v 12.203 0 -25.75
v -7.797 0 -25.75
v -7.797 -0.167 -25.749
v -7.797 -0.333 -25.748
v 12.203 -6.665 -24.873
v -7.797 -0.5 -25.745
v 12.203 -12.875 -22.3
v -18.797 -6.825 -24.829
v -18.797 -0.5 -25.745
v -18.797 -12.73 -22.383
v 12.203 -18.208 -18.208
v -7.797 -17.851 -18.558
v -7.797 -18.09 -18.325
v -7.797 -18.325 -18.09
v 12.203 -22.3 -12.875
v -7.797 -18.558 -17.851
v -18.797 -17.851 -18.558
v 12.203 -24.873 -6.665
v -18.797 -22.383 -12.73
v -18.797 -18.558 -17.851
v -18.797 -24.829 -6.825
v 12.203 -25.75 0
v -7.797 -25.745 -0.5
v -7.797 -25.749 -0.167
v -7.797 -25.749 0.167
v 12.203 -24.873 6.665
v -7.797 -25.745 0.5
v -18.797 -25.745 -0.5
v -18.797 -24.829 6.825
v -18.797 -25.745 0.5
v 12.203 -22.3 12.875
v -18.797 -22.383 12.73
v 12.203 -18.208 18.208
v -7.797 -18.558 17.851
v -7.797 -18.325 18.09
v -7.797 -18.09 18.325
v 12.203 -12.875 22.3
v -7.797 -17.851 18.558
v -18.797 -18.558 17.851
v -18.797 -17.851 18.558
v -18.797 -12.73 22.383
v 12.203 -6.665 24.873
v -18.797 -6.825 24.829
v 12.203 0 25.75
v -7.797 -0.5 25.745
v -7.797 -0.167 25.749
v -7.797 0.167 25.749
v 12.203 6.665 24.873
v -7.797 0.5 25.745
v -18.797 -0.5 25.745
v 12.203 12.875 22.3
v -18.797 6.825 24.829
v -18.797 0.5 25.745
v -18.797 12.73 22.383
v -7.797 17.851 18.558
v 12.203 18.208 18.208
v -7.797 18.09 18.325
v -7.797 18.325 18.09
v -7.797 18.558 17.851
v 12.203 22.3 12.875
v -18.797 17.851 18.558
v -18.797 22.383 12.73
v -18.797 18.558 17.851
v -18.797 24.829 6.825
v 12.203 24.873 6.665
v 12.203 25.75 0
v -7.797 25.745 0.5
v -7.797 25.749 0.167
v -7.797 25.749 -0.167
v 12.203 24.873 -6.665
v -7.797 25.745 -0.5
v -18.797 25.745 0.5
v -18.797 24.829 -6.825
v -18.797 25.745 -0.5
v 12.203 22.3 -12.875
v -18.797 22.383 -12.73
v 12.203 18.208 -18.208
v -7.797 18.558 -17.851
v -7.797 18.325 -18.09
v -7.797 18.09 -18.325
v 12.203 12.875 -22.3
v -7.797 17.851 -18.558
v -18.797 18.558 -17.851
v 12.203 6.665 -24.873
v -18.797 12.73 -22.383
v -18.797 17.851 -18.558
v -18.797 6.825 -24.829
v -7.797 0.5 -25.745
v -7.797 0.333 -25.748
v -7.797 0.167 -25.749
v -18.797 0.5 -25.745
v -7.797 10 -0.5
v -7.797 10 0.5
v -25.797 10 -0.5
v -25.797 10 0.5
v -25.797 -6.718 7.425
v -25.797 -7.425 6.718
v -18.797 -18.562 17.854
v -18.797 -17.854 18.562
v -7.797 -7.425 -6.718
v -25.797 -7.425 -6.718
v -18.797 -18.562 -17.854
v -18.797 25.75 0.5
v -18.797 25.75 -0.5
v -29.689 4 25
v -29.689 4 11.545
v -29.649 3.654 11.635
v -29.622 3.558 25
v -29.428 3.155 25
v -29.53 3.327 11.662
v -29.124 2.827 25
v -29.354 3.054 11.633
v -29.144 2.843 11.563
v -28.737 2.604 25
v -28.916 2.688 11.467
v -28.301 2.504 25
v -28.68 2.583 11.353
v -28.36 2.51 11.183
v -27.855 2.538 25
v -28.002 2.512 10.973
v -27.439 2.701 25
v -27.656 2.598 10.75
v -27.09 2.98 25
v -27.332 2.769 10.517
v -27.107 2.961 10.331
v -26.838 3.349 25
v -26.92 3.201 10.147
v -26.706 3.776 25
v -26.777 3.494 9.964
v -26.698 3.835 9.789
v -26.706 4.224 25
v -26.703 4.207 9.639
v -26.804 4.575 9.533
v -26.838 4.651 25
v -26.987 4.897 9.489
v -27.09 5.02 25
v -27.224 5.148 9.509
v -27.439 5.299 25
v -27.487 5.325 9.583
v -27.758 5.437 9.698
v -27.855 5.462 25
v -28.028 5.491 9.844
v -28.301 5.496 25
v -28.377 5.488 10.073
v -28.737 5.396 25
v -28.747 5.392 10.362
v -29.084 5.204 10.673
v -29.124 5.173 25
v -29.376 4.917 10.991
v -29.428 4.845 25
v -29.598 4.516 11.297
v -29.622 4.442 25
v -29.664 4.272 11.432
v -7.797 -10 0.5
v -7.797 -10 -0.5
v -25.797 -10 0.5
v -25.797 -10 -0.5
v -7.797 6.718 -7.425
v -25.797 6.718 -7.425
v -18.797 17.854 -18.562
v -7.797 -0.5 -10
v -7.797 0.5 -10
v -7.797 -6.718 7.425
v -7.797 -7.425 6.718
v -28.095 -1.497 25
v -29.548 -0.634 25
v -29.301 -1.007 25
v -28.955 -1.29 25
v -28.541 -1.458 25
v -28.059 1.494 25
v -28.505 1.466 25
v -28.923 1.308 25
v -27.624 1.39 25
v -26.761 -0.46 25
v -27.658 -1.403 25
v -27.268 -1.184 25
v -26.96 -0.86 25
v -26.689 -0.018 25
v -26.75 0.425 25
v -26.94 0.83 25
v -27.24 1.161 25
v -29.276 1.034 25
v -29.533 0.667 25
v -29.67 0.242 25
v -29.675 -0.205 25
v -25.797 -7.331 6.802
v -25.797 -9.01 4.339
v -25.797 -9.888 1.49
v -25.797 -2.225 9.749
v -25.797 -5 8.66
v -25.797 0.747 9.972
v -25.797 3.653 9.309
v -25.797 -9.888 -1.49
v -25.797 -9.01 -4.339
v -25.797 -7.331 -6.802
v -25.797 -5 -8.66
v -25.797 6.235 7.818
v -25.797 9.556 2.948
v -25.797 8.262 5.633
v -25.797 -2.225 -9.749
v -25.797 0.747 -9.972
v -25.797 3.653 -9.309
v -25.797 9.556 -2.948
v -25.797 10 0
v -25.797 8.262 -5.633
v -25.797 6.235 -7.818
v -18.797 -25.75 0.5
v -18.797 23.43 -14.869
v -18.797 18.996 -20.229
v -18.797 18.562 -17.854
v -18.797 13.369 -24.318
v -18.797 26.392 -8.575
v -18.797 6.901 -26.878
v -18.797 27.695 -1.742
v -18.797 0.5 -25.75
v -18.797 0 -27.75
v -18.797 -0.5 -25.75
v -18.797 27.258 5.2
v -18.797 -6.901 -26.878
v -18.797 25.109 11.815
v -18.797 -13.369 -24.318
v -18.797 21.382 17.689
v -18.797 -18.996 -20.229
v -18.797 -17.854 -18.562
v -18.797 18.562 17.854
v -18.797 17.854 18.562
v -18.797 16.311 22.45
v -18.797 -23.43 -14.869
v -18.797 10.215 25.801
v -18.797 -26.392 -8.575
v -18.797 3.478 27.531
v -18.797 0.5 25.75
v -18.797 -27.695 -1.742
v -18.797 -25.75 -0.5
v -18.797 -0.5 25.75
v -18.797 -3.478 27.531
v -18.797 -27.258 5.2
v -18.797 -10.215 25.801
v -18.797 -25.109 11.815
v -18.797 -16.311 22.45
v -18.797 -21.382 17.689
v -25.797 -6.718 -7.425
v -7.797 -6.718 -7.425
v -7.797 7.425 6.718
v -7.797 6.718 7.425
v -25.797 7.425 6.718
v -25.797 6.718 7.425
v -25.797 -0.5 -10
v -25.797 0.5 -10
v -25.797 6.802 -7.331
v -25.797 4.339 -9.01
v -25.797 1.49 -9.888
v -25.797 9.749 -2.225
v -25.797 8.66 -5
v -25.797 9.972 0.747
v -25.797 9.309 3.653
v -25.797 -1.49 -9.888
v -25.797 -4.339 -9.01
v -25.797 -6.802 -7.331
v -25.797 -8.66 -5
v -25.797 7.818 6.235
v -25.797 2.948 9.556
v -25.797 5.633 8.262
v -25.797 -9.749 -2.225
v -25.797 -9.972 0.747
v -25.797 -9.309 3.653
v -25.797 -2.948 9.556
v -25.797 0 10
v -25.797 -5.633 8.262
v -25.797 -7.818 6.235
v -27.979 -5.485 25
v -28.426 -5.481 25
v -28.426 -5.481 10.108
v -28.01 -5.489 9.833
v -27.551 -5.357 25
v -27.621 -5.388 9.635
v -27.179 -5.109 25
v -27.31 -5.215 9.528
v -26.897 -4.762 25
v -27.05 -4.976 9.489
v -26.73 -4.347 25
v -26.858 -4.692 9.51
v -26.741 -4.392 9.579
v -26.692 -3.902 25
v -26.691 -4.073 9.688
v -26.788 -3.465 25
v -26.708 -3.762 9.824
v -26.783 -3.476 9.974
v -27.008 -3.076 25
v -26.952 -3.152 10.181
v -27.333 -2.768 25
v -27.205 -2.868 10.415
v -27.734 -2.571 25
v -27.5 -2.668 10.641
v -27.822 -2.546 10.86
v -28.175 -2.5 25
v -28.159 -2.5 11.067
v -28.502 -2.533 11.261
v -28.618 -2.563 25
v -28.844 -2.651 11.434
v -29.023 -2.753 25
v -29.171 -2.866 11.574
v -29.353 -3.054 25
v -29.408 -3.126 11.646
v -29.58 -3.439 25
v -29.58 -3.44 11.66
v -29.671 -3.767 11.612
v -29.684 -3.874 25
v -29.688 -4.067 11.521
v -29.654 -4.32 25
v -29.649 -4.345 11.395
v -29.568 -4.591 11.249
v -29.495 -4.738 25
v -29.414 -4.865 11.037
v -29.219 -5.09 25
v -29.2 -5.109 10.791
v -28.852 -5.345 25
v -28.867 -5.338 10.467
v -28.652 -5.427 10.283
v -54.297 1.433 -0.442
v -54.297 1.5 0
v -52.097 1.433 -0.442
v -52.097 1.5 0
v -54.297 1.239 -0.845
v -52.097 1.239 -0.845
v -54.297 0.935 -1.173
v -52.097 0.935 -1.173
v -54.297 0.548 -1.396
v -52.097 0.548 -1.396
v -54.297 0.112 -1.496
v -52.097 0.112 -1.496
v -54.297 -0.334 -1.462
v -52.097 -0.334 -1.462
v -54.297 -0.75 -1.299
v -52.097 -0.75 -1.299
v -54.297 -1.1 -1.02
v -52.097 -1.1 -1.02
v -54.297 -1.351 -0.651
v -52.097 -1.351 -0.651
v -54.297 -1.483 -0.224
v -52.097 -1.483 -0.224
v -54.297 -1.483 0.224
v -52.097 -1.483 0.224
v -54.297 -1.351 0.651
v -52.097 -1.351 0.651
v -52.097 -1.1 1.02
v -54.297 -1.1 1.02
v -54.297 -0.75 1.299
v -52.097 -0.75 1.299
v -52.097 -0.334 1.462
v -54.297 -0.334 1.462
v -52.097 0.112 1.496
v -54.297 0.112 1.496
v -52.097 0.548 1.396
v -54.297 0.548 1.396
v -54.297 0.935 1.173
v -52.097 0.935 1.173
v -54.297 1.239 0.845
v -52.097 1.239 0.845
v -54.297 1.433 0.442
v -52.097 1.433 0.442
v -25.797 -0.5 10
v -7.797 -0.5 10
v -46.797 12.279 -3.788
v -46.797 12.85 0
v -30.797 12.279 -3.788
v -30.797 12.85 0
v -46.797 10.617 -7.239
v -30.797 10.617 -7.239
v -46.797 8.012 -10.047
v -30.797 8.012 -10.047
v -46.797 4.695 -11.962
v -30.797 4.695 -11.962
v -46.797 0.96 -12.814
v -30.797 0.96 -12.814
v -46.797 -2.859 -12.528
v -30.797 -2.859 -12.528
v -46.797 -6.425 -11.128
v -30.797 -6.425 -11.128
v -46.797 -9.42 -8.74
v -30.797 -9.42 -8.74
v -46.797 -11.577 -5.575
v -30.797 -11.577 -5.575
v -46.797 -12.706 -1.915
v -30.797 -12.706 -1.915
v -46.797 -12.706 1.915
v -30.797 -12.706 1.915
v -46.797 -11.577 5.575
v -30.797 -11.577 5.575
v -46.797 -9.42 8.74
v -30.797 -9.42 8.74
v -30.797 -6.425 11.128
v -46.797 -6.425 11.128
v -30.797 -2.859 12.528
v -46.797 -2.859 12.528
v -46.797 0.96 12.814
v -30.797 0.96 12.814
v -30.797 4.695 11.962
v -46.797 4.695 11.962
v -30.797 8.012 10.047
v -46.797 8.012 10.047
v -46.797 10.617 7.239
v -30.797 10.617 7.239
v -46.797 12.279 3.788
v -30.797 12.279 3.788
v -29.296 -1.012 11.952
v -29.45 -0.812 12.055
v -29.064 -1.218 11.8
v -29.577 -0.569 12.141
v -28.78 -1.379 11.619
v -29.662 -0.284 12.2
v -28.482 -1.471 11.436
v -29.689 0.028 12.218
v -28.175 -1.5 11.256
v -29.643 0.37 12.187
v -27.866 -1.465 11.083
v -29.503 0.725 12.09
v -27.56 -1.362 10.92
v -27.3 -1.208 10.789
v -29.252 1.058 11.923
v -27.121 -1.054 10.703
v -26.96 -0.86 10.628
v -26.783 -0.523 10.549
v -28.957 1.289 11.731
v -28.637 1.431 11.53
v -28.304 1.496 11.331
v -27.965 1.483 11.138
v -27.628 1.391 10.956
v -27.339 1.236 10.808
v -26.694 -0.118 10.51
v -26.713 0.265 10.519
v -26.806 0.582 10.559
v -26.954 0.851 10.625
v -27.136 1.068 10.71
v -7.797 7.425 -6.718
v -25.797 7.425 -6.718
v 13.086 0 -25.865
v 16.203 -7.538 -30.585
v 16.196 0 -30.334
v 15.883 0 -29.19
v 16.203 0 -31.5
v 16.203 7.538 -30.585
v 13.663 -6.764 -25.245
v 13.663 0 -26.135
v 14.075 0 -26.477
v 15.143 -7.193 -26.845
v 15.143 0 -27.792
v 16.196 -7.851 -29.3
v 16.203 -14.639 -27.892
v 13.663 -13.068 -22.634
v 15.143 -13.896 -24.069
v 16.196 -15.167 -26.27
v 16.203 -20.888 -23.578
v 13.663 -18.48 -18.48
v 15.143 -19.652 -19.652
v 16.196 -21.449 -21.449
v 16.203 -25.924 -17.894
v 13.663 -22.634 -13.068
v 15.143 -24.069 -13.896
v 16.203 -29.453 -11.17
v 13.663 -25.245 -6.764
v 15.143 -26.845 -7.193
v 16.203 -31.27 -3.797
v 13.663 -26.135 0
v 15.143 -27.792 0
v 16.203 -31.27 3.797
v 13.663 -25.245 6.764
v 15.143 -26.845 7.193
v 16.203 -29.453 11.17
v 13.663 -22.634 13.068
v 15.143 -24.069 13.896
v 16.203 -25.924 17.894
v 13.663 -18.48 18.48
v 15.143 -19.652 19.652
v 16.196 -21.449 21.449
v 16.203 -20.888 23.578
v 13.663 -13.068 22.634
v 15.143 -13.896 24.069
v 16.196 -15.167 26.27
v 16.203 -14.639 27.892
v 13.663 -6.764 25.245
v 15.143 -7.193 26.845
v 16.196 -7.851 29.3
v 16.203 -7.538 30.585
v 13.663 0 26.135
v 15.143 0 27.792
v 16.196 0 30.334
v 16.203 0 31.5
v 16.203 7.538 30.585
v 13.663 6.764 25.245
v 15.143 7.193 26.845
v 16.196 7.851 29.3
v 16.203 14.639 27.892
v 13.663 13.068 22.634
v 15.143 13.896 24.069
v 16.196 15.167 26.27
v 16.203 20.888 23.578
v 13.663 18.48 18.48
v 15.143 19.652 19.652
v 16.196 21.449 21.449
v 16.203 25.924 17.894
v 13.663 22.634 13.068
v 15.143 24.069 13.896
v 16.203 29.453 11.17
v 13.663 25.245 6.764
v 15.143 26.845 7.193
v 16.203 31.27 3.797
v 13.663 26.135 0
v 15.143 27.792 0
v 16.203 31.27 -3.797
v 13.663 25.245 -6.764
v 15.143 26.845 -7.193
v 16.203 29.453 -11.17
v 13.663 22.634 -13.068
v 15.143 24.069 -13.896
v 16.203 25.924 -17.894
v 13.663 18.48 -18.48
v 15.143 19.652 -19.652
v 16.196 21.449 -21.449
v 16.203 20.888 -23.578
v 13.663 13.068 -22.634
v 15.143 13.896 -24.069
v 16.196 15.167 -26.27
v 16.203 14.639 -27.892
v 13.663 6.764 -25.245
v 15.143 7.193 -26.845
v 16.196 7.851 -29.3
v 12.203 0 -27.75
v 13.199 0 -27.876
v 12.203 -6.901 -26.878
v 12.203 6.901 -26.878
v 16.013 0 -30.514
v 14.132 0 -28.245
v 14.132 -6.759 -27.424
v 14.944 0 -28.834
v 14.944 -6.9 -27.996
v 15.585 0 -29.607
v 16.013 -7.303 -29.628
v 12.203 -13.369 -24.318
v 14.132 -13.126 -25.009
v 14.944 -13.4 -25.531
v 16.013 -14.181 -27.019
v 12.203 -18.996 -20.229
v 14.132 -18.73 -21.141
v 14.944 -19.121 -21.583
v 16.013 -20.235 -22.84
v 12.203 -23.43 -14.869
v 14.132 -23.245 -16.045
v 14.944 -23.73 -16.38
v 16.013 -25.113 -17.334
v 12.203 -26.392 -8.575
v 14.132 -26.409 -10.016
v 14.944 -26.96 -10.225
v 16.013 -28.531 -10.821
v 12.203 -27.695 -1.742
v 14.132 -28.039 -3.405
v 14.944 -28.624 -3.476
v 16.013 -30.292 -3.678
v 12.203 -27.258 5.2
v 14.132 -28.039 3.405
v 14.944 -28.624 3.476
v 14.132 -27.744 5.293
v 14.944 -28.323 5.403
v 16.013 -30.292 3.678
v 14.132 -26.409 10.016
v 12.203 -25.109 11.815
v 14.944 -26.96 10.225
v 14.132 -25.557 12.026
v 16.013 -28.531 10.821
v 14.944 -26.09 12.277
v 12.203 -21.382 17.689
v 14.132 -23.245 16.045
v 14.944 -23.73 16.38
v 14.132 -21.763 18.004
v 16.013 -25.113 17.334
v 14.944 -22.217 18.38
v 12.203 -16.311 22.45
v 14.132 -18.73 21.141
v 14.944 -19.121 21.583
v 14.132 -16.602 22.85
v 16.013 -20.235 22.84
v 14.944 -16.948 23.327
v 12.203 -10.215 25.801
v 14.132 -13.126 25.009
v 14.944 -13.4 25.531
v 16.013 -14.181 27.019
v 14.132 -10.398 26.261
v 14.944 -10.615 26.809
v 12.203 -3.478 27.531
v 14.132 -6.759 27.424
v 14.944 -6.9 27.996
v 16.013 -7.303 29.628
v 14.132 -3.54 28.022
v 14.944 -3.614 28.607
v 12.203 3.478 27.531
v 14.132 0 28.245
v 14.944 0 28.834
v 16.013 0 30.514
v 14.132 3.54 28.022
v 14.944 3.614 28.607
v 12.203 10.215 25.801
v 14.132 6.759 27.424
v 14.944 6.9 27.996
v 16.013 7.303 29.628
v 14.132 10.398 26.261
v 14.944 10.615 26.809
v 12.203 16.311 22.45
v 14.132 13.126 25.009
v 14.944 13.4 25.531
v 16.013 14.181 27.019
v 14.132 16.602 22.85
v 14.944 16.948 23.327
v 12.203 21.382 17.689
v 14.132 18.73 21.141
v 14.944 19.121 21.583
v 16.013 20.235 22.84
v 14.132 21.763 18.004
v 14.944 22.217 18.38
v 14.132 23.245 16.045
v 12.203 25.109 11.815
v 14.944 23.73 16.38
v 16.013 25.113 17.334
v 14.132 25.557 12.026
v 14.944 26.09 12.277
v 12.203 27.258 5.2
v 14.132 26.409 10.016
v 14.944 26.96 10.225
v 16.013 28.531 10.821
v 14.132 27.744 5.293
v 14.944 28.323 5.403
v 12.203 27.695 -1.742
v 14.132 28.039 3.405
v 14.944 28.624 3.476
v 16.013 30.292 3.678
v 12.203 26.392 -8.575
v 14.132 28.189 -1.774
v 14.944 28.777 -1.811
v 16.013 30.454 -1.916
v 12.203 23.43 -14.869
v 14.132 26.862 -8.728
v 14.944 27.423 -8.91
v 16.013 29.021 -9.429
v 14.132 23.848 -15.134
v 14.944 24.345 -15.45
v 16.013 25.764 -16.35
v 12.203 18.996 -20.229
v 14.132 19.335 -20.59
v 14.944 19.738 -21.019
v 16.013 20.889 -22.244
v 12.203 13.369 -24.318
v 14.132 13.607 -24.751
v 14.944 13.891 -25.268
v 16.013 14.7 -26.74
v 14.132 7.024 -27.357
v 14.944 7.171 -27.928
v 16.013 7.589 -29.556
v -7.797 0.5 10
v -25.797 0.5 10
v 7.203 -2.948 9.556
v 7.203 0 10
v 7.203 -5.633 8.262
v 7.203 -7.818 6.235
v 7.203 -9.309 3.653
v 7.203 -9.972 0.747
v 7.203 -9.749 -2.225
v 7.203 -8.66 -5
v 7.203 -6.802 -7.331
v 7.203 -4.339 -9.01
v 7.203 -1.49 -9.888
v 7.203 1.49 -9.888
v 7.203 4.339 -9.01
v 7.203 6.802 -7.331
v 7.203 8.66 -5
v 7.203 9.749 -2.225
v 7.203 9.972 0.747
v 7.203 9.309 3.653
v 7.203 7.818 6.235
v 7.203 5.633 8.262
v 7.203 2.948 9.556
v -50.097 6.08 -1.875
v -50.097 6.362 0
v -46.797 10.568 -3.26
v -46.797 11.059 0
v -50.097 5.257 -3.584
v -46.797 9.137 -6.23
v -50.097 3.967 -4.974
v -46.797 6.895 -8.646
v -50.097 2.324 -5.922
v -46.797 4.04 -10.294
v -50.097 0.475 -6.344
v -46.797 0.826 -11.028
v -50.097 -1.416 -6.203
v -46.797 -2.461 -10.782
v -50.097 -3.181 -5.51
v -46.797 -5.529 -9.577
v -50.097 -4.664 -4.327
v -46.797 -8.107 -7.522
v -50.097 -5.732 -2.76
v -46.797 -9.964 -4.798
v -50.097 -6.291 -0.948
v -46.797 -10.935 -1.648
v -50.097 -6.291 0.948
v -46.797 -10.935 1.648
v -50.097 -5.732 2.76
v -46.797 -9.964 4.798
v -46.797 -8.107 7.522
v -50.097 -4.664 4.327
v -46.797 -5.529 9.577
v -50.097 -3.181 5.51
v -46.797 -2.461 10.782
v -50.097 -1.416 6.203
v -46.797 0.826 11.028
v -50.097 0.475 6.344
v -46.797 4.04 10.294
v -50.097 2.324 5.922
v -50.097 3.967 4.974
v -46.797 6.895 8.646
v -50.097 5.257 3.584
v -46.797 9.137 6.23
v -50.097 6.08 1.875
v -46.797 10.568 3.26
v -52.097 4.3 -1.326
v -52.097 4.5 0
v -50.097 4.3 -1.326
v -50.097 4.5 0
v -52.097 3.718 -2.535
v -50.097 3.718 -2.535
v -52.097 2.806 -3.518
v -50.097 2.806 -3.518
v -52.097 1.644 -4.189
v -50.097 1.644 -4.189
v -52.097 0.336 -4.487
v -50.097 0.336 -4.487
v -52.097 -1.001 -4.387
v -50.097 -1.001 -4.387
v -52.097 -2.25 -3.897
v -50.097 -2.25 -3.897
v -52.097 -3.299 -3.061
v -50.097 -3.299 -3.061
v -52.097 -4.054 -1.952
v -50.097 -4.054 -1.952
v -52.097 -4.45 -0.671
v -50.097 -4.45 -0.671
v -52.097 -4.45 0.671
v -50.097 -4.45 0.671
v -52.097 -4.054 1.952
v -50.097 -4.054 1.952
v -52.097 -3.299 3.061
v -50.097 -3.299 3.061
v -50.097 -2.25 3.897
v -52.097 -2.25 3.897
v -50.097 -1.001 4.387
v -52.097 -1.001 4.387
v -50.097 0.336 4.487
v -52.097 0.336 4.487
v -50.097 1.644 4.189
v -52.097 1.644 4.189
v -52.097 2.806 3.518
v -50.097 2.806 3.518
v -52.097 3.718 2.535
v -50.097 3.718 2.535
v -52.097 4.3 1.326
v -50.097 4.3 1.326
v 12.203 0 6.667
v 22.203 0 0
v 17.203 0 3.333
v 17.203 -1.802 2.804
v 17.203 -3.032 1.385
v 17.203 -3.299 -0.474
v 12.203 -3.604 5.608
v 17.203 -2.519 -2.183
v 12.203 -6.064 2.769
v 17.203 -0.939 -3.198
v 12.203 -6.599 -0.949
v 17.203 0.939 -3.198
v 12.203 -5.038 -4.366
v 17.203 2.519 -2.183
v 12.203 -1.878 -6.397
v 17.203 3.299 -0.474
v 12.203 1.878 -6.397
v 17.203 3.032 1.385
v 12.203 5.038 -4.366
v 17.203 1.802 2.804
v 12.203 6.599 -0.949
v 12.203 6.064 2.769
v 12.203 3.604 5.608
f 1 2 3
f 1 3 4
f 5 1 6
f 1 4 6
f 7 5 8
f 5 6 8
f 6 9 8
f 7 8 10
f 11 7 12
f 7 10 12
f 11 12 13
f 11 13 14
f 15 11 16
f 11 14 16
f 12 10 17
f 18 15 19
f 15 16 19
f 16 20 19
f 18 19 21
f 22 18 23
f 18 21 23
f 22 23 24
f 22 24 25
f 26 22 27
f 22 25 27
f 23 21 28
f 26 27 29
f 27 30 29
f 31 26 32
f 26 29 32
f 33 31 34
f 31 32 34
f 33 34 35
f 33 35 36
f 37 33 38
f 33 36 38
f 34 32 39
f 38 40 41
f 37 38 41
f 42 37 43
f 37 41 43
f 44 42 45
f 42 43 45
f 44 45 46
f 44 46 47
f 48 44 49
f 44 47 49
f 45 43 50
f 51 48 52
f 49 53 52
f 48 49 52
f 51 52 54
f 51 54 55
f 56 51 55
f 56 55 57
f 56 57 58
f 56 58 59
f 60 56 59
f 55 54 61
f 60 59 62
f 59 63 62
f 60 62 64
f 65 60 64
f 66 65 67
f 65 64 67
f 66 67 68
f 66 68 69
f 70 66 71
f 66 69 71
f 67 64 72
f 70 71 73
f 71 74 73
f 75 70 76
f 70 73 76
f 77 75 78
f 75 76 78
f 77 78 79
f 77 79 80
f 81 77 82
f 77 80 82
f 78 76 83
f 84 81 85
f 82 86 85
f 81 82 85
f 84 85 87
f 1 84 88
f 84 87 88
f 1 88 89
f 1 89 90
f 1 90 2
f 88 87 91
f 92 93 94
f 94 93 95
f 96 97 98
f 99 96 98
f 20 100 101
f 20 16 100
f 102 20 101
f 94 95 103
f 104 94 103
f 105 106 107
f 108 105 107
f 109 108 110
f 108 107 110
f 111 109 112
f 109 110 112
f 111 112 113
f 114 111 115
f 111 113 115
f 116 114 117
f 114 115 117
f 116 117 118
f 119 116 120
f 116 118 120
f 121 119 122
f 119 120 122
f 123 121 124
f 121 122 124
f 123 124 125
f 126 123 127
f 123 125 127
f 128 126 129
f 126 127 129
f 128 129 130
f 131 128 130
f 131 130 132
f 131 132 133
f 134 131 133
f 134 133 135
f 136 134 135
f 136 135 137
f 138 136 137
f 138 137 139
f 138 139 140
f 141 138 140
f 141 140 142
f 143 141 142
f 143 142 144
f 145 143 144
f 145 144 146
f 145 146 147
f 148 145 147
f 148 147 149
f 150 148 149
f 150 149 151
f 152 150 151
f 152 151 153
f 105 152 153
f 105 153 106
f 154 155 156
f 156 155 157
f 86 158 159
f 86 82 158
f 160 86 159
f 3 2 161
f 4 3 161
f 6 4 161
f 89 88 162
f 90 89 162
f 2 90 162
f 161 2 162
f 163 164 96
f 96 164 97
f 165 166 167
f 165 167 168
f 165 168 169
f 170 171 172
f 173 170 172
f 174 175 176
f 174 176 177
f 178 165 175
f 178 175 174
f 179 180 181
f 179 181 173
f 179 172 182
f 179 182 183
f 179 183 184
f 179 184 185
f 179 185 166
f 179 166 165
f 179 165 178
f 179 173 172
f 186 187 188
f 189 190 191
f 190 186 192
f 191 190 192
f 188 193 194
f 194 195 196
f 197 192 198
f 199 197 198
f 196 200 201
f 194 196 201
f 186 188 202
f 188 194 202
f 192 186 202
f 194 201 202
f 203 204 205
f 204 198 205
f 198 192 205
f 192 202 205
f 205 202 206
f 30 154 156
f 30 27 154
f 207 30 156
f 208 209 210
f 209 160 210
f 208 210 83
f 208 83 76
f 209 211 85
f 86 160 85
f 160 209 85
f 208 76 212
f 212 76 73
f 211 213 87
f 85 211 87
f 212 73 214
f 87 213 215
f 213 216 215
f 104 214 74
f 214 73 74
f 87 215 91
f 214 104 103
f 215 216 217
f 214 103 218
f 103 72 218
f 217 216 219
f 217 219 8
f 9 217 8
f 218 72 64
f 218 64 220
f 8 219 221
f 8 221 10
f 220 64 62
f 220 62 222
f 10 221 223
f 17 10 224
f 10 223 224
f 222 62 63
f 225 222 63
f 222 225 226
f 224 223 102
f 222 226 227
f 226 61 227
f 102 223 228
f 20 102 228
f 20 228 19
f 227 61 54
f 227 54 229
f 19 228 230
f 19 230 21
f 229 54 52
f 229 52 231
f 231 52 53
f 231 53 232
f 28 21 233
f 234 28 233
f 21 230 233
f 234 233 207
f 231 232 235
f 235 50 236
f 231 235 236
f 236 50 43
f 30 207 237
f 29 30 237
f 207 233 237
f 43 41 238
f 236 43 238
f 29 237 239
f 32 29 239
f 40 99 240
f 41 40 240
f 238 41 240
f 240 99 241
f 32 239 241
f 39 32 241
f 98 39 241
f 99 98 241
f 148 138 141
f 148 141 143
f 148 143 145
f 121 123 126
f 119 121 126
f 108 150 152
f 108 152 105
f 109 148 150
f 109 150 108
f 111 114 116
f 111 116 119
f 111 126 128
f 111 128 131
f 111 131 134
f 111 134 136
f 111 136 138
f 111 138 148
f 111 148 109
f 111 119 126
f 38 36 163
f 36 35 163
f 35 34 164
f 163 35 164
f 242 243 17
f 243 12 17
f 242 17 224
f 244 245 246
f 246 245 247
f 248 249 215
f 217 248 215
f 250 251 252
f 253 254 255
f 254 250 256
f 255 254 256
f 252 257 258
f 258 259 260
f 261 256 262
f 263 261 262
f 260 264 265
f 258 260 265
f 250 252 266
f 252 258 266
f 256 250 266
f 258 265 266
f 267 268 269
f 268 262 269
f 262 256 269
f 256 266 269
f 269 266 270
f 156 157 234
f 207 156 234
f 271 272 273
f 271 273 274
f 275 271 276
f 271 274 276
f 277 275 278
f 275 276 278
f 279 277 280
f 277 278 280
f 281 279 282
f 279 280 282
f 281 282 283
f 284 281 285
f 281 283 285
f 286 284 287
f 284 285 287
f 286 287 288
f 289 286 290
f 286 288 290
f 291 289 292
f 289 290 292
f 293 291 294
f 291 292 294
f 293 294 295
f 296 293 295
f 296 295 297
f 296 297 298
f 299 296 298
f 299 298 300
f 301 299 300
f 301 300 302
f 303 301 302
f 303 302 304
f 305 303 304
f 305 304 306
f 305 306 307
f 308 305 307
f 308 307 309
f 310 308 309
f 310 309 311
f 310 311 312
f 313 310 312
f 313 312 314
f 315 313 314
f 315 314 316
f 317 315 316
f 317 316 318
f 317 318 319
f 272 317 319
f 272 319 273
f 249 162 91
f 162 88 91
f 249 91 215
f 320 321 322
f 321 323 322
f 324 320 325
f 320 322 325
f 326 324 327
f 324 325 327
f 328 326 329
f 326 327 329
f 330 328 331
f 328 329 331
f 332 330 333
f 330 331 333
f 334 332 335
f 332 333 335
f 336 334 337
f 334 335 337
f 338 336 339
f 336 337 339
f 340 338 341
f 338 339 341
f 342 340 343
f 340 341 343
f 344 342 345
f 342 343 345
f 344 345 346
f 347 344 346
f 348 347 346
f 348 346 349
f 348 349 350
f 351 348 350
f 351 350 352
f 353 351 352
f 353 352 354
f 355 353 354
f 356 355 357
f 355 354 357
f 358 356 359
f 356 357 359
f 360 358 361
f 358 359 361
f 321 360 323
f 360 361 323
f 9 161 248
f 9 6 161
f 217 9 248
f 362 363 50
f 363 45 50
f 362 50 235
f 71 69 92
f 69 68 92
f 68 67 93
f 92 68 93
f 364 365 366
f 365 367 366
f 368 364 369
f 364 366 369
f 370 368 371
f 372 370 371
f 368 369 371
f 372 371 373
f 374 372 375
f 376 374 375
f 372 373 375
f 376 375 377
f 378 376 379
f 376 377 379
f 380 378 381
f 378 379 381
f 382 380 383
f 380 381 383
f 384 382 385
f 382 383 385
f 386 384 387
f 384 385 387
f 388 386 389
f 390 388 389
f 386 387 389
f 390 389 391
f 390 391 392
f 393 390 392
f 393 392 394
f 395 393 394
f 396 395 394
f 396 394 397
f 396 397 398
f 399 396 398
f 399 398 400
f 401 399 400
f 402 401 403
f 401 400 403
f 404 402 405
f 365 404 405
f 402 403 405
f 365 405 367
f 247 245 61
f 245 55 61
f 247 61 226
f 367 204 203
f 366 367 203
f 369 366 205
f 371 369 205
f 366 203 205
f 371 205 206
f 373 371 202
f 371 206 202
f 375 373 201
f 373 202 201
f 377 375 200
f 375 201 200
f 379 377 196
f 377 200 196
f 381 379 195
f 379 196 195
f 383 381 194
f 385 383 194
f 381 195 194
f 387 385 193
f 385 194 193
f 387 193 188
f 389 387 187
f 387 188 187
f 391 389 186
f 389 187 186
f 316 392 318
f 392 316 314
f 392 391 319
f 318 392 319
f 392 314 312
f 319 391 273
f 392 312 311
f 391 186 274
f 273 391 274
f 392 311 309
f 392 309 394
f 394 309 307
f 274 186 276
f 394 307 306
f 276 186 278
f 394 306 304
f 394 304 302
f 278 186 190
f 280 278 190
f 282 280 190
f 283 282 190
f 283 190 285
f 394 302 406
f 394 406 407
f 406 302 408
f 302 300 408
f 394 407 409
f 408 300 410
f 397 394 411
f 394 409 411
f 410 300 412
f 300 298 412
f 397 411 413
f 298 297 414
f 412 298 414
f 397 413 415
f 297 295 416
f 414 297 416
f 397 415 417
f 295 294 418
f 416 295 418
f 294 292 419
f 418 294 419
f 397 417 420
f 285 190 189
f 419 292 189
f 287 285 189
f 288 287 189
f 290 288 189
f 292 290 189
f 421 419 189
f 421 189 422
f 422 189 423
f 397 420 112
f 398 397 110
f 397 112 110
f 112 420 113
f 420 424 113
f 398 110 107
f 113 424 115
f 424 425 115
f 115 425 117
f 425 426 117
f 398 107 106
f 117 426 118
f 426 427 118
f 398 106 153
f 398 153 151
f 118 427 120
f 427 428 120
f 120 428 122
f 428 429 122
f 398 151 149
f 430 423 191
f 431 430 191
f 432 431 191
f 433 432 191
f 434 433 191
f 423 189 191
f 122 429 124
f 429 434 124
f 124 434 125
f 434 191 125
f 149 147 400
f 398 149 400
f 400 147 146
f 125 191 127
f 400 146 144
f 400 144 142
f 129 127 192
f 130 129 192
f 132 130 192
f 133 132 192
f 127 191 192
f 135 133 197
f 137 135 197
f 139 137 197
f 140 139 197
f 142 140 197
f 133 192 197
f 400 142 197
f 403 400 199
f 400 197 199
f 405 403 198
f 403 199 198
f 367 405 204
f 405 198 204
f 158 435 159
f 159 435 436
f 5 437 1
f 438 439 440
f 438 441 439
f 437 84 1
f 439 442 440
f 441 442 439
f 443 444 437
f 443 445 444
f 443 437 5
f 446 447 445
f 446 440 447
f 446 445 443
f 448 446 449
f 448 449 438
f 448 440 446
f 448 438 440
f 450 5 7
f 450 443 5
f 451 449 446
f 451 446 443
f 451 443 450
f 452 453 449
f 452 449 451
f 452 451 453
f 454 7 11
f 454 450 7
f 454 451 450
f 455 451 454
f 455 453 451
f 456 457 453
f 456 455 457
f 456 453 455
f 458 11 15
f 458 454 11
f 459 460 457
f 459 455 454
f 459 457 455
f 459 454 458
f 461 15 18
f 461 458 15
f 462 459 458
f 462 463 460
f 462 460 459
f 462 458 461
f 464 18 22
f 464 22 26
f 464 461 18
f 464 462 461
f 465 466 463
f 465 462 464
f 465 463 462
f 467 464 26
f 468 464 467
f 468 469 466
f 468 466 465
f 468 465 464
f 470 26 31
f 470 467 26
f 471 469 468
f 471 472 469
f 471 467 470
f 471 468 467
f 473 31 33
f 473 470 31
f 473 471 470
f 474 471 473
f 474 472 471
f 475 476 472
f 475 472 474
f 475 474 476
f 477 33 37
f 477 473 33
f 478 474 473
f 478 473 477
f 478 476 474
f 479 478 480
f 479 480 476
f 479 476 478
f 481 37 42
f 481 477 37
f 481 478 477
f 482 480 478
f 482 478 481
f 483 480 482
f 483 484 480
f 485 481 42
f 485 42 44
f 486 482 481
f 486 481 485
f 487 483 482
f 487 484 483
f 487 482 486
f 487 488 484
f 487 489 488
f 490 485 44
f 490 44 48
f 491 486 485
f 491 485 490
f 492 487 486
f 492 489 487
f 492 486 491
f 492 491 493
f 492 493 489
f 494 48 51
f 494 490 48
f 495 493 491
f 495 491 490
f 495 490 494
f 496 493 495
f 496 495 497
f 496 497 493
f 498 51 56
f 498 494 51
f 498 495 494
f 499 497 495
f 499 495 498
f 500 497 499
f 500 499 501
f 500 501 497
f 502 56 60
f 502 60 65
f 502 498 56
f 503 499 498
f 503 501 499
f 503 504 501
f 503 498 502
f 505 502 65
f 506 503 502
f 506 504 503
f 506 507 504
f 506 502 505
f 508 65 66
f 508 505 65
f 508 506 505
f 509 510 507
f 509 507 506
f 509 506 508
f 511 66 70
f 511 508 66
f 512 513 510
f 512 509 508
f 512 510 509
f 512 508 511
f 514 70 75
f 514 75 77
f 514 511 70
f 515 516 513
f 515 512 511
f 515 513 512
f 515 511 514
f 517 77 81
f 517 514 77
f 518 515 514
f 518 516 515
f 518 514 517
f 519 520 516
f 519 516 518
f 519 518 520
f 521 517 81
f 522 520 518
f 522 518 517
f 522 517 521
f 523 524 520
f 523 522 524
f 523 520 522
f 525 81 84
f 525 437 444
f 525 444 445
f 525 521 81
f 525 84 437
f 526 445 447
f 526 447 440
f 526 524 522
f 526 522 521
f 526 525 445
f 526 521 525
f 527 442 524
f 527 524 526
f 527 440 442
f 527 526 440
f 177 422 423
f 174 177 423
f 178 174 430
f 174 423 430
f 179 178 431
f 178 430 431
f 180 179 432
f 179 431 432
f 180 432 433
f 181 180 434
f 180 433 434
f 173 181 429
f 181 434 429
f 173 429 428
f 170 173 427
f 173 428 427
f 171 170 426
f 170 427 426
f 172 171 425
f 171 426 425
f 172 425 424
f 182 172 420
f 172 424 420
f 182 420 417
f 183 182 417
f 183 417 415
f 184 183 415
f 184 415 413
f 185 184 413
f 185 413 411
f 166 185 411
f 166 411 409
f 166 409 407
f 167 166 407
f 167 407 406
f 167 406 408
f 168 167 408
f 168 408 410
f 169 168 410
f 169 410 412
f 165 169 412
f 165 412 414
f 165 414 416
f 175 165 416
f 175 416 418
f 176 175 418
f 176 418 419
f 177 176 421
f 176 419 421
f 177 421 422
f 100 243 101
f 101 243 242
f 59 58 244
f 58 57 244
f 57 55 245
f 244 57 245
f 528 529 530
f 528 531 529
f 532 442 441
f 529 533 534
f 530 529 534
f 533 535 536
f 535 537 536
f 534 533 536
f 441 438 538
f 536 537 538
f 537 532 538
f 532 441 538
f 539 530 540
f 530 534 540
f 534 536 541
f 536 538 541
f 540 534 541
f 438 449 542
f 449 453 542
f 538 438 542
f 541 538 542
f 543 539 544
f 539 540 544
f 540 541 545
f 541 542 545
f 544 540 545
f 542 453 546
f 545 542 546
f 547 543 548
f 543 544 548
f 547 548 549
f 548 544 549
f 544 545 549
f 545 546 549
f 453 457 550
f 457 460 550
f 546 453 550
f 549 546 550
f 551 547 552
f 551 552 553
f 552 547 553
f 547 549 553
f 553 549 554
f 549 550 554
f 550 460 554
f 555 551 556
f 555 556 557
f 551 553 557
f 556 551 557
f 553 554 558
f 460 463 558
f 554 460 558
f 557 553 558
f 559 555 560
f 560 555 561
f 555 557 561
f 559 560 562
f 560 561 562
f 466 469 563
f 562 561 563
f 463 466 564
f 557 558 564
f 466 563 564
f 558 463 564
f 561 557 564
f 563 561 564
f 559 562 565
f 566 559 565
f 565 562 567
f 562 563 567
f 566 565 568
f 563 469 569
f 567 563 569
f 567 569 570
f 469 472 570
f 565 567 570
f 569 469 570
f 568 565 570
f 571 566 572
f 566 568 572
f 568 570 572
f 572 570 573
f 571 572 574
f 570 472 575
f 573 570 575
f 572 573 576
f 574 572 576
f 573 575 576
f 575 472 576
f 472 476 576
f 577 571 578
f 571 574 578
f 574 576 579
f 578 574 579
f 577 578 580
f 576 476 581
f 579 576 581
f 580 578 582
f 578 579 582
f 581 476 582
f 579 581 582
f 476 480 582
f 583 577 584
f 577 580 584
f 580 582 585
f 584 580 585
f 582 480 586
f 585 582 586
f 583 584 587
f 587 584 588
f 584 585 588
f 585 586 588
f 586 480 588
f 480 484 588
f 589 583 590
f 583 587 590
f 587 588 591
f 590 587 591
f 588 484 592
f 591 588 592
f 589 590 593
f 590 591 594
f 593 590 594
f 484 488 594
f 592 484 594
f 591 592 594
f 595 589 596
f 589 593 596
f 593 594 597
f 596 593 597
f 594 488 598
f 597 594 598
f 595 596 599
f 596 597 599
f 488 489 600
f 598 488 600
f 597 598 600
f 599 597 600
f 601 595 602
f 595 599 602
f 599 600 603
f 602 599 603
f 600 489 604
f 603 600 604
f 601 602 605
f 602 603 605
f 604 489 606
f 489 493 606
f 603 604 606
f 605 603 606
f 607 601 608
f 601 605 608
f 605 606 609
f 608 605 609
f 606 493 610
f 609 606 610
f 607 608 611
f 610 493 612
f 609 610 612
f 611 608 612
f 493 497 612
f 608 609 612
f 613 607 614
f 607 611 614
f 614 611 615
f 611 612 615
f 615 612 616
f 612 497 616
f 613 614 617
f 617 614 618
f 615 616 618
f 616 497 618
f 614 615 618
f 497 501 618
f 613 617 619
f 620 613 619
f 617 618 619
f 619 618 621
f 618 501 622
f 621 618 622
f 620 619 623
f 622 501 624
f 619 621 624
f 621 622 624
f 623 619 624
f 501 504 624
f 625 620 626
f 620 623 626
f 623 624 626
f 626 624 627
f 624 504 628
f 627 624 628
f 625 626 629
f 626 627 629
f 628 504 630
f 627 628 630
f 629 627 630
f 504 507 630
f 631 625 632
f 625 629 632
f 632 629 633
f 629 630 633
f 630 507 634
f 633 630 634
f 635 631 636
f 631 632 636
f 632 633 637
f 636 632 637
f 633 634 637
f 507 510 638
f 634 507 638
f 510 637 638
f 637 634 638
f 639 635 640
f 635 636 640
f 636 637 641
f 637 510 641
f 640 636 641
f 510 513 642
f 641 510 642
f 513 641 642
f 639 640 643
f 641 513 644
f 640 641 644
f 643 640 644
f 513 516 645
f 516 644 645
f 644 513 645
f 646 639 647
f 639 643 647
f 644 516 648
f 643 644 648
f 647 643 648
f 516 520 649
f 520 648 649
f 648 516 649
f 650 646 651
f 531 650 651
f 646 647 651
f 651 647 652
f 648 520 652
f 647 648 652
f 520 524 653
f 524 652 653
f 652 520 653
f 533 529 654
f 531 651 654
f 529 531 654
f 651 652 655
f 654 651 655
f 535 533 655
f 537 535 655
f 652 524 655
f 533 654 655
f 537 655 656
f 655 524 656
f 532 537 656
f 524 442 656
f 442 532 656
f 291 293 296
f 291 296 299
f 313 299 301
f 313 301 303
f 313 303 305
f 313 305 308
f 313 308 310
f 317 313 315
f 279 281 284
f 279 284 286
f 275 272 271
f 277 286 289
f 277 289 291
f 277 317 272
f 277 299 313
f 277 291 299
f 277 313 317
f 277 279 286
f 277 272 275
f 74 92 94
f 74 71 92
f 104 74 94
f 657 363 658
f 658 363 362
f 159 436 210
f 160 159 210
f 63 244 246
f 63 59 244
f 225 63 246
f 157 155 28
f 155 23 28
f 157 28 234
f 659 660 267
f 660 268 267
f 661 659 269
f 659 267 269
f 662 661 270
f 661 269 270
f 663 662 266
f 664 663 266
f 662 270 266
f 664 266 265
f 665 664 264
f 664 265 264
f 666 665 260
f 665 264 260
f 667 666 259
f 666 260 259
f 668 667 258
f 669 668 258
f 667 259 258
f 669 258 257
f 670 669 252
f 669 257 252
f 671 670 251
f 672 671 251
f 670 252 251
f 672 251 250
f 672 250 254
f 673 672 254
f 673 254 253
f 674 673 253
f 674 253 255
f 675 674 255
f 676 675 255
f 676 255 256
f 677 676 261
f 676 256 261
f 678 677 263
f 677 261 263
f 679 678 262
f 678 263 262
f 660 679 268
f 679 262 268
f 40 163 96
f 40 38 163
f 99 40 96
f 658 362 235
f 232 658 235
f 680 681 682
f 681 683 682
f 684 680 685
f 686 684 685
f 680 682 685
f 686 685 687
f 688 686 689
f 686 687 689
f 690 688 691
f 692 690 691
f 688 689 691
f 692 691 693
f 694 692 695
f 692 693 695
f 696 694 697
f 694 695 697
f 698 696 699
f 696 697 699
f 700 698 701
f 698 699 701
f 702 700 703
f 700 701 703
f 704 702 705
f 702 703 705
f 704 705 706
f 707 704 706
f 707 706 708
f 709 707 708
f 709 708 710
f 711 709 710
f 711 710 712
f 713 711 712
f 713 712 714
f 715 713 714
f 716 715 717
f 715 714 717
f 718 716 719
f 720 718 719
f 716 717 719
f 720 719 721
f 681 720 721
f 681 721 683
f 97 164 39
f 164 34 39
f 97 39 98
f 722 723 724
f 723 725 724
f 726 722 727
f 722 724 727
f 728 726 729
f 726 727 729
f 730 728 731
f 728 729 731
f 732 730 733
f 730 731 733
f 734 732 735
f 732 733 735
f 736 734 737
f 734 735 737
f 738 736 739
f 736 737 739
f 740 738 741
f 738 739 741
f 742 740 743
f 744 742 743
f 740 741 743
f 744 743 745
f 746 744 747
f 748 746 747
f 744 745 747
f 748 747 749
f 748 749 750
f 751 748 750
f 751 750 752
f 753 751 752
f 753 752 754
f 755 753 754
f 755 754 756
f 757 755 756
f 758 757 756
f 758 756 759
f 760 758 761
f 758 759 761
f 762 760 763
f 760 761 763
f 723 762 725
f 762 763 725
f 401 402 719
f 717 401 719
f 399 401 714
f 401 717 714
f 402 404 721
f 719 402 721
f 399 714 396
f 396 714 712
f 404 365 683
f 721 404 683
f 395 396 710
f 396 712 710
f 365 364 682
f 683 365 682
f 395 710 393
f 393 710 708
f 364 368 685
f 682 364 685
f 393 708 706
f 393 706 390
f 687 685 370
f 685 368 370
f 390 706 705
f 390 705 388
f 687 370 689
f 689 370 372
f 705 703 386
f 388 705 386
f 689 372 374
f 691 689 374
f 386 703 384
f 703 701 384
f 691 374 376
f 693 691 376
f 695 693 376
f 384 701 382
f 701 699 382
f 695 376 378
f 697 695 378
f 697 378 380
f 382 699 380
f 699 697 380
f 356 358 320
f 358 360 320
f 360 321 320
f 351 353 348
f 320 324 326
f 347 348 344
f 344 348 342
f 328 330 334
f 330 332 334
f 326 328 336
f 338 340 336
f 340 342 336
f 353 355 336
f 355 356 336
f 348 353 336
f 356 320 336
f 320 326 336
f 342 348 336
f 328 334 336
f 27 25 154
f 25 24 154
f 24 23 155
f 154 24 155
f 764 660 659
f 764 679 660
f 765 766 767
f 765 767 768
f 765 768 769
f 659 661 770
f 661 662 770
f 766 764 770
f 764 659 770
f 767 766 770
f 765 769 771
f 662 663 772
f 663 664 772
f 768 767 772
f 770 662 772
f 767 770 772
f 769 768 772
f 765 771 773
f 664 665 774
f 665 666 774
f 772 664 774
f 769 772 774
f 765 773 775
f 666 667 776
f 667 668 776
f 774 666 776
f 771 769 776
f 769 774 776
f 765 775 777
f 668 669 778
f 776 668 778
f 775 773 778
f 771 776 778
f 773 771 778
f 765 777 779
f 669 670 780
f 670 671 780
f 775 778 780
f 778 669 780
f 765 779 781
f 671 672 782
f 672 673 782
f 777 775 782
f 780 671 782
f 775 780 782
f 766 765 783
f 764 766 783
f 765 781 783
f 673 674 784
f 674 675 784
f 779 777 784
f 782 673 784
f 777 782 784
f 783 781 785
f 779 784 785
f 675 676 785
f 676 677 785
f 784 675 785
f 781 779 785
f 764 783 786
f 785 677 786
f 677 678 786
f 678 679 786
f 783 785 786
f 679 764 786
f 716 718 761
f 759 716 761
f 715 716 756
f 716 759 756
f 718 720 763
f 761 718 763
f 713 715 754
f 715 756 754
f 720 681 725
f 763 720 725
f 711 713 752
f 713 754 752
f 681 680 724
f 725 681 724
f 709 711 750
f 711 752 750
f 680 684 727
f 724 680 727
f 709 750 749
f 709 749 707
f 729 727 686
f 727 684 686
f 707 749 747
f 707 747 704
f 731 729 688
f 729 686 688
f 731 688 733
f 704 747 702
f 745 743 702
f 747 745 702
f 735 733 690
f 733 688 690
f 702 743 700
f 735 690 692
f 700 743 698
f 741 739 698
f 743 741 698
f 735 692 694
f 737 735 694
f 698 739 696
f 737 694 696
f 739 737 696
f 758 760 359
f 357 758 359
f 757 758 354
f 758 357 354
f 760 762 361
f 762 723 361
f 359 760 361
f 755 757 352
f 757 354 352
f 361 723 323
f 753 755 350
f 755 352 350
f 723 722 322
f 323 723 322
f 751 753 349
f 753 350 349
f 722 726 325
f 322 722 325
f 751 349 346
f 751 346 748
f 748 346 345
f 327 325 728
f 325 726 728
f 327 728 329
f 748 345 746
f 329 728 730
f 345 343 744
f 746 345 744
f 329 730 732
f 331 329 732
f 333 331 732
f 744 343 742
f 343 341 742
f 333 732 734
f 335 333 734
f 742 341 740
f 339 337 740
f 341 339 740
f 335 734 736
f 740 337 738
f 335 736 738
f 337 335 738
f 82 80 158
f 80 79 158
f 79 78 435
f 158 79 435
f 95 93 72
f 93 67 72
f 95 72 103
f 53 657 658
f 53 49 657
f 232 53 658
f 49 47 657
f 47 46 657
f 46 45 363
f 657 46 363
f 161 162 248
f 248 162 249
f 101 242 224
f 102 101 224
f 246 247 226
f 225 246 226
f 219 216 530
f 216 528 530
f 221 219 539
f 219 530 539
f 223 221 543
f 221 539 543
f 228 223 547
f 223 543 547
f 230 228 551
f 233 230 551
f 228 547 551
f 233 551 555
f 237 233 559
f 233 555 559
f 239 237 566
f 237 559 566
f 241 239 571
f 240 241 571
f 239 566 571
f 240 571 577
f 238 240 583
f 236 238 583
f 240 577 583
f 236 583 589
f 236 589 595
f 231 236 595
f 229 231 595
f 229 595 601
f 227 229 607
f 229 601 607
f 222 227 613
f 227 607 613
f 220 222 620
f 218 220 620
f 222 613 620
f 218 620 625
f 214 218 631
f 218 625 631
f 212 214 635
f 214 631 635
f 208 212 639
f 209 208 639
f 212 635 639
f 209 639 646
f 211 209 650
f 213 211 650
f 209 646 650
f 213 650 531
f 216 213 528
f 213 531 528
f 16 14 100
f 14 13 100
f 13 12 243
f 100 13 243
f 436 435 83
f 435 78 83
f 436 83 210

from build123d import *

# Parameters (mm, degrees)
BOSS_EXTRU_1_DEPTH           = 0.5
R_P_TITION_CIRCULAIRE1_COUNT = 8
ESQUISSE5_R                  = 1.5
BOSS_EXTRU_2_DEPTH           = 25


with BuildPart() as part:
    # Esquisse1 → Révolution1 (revolve)
    with BuildSketch(Plane.XY, mode=Mode.PRIVATE) as r_volution1_sk:
        with BuildLine():
            Line((-18.797047196, 27.75), (12.202952804, 27.75))
            ThreePointArc((12.202952804, 27.75), (14.944416829, 28.83410504), (16.202952804, 31.5))
            add(Edge.make_bspline(
                [(12.202952804, 25.75), (13.310921502, 25.75), (14.941747161, 27.131971286), (16.465207227, 29.749374737), (16.202952804, 31.5)],
                knots=[0, 0, 0, 0, 0.303786725, 1, 1, 1, 1], degree=3))
            Line((12.202952804, 25.75), (-18.797047196, 25.75))
            Line((-18.797047196, 25.75), (-18.797047196, 27.75))
        make_face()
    revolve(r_volution1_sk.sketch.rotate(Axis((0, 0, 0), (-1, 0, 0)), 90), axis=Axis((0, 0, 0), (-1, 0, 0)))

    # Esquisse3 → Boss.-Extru.1 (add, symmetric)
    with BuildSketch(Plane.XY):
        Polygon((-25.797047196, 10), (-18.797047196, 25.75), (-7.797047196, 25.75), (-7.797047196, 10), align=None)
    boss_extru_1 = extrude(amount=BOSS_EXTRU_1_DEPTH, both=True)

    # Répétition circulaire1: Boss.-Extru.1 ×8 about axis
    r_p_tition_circulaire1_axis = Axis((0, 0, 0), (1, 0, 0))
    for i in range(1, R_P_TITION_CIRCULAIRE1_COUNT):
        add(boss_extru_1.rotate(r_p_tition_circulaire1_axis, i * 360 / R_P_TITION_CIRCULAIRE1_COUNT))


with BuildPart() as body_2:
    # Esquisse2 → Révolution2 (revolve)
    with BuildSketch(Plane.XY, mode=Mode.PRIVATE) as r_volution2_sk:
        Polygon((22.202952804, 0), (7.202952804, 10), (-25.797047196, 10), (-25.797047196, 0), (7.202952804, 0), align=None)
    revolve(r_volution2_sk.sketch.rotate(Axis((7.202952804, 0, 0), (1, 0, 0)), 90), axis=Axis((7.202952804, 0, 0), (1, 0, 0)))


with BuildPart() as body_3:
    # Esquisse4 → Révolution3 (revolve)
    with BuildSketch(Plane.XY):
        Polygon((-54.297047196, 0), (-54.297047196, 1.5), (-52.097047196, 1.5), (-52.097047196, 4.5), (-50.097047196, 4.5), (-50.097047196, 6.362262945), (-46.797047196, 11.058827063), (-46.797047196, 12.85), (-30.797047196, 12.85), (-25.797047196, 10), (-25.797047196, 0), align=None)
    revolve(axis=Axis((0, 0, 0), (-1, 0, 0)))

    # Esquisse5 → Boss.-Extru.2 (add)
    with BuildSketch(Plane.XY):
        with Locations(Location((-28.189106073, 0, 0), (0, 0, 325.013813059))):
            Circle(ESQUISSE5_R)
        with Locations(Location((-28.189106073, -4, 0), (0, 0, 260.904193344))):
            Circle(ESQUISSE5_R)
        with Locations(Location((-28.189106073, 4, 0), (0, 0, 180))):
            Circle(ESQUISSE5_R)
    extrude(amount=BOSS_EXTRU_2_DEPTH)


solid = Compound([part.part, body_2.part, body_3.part])
